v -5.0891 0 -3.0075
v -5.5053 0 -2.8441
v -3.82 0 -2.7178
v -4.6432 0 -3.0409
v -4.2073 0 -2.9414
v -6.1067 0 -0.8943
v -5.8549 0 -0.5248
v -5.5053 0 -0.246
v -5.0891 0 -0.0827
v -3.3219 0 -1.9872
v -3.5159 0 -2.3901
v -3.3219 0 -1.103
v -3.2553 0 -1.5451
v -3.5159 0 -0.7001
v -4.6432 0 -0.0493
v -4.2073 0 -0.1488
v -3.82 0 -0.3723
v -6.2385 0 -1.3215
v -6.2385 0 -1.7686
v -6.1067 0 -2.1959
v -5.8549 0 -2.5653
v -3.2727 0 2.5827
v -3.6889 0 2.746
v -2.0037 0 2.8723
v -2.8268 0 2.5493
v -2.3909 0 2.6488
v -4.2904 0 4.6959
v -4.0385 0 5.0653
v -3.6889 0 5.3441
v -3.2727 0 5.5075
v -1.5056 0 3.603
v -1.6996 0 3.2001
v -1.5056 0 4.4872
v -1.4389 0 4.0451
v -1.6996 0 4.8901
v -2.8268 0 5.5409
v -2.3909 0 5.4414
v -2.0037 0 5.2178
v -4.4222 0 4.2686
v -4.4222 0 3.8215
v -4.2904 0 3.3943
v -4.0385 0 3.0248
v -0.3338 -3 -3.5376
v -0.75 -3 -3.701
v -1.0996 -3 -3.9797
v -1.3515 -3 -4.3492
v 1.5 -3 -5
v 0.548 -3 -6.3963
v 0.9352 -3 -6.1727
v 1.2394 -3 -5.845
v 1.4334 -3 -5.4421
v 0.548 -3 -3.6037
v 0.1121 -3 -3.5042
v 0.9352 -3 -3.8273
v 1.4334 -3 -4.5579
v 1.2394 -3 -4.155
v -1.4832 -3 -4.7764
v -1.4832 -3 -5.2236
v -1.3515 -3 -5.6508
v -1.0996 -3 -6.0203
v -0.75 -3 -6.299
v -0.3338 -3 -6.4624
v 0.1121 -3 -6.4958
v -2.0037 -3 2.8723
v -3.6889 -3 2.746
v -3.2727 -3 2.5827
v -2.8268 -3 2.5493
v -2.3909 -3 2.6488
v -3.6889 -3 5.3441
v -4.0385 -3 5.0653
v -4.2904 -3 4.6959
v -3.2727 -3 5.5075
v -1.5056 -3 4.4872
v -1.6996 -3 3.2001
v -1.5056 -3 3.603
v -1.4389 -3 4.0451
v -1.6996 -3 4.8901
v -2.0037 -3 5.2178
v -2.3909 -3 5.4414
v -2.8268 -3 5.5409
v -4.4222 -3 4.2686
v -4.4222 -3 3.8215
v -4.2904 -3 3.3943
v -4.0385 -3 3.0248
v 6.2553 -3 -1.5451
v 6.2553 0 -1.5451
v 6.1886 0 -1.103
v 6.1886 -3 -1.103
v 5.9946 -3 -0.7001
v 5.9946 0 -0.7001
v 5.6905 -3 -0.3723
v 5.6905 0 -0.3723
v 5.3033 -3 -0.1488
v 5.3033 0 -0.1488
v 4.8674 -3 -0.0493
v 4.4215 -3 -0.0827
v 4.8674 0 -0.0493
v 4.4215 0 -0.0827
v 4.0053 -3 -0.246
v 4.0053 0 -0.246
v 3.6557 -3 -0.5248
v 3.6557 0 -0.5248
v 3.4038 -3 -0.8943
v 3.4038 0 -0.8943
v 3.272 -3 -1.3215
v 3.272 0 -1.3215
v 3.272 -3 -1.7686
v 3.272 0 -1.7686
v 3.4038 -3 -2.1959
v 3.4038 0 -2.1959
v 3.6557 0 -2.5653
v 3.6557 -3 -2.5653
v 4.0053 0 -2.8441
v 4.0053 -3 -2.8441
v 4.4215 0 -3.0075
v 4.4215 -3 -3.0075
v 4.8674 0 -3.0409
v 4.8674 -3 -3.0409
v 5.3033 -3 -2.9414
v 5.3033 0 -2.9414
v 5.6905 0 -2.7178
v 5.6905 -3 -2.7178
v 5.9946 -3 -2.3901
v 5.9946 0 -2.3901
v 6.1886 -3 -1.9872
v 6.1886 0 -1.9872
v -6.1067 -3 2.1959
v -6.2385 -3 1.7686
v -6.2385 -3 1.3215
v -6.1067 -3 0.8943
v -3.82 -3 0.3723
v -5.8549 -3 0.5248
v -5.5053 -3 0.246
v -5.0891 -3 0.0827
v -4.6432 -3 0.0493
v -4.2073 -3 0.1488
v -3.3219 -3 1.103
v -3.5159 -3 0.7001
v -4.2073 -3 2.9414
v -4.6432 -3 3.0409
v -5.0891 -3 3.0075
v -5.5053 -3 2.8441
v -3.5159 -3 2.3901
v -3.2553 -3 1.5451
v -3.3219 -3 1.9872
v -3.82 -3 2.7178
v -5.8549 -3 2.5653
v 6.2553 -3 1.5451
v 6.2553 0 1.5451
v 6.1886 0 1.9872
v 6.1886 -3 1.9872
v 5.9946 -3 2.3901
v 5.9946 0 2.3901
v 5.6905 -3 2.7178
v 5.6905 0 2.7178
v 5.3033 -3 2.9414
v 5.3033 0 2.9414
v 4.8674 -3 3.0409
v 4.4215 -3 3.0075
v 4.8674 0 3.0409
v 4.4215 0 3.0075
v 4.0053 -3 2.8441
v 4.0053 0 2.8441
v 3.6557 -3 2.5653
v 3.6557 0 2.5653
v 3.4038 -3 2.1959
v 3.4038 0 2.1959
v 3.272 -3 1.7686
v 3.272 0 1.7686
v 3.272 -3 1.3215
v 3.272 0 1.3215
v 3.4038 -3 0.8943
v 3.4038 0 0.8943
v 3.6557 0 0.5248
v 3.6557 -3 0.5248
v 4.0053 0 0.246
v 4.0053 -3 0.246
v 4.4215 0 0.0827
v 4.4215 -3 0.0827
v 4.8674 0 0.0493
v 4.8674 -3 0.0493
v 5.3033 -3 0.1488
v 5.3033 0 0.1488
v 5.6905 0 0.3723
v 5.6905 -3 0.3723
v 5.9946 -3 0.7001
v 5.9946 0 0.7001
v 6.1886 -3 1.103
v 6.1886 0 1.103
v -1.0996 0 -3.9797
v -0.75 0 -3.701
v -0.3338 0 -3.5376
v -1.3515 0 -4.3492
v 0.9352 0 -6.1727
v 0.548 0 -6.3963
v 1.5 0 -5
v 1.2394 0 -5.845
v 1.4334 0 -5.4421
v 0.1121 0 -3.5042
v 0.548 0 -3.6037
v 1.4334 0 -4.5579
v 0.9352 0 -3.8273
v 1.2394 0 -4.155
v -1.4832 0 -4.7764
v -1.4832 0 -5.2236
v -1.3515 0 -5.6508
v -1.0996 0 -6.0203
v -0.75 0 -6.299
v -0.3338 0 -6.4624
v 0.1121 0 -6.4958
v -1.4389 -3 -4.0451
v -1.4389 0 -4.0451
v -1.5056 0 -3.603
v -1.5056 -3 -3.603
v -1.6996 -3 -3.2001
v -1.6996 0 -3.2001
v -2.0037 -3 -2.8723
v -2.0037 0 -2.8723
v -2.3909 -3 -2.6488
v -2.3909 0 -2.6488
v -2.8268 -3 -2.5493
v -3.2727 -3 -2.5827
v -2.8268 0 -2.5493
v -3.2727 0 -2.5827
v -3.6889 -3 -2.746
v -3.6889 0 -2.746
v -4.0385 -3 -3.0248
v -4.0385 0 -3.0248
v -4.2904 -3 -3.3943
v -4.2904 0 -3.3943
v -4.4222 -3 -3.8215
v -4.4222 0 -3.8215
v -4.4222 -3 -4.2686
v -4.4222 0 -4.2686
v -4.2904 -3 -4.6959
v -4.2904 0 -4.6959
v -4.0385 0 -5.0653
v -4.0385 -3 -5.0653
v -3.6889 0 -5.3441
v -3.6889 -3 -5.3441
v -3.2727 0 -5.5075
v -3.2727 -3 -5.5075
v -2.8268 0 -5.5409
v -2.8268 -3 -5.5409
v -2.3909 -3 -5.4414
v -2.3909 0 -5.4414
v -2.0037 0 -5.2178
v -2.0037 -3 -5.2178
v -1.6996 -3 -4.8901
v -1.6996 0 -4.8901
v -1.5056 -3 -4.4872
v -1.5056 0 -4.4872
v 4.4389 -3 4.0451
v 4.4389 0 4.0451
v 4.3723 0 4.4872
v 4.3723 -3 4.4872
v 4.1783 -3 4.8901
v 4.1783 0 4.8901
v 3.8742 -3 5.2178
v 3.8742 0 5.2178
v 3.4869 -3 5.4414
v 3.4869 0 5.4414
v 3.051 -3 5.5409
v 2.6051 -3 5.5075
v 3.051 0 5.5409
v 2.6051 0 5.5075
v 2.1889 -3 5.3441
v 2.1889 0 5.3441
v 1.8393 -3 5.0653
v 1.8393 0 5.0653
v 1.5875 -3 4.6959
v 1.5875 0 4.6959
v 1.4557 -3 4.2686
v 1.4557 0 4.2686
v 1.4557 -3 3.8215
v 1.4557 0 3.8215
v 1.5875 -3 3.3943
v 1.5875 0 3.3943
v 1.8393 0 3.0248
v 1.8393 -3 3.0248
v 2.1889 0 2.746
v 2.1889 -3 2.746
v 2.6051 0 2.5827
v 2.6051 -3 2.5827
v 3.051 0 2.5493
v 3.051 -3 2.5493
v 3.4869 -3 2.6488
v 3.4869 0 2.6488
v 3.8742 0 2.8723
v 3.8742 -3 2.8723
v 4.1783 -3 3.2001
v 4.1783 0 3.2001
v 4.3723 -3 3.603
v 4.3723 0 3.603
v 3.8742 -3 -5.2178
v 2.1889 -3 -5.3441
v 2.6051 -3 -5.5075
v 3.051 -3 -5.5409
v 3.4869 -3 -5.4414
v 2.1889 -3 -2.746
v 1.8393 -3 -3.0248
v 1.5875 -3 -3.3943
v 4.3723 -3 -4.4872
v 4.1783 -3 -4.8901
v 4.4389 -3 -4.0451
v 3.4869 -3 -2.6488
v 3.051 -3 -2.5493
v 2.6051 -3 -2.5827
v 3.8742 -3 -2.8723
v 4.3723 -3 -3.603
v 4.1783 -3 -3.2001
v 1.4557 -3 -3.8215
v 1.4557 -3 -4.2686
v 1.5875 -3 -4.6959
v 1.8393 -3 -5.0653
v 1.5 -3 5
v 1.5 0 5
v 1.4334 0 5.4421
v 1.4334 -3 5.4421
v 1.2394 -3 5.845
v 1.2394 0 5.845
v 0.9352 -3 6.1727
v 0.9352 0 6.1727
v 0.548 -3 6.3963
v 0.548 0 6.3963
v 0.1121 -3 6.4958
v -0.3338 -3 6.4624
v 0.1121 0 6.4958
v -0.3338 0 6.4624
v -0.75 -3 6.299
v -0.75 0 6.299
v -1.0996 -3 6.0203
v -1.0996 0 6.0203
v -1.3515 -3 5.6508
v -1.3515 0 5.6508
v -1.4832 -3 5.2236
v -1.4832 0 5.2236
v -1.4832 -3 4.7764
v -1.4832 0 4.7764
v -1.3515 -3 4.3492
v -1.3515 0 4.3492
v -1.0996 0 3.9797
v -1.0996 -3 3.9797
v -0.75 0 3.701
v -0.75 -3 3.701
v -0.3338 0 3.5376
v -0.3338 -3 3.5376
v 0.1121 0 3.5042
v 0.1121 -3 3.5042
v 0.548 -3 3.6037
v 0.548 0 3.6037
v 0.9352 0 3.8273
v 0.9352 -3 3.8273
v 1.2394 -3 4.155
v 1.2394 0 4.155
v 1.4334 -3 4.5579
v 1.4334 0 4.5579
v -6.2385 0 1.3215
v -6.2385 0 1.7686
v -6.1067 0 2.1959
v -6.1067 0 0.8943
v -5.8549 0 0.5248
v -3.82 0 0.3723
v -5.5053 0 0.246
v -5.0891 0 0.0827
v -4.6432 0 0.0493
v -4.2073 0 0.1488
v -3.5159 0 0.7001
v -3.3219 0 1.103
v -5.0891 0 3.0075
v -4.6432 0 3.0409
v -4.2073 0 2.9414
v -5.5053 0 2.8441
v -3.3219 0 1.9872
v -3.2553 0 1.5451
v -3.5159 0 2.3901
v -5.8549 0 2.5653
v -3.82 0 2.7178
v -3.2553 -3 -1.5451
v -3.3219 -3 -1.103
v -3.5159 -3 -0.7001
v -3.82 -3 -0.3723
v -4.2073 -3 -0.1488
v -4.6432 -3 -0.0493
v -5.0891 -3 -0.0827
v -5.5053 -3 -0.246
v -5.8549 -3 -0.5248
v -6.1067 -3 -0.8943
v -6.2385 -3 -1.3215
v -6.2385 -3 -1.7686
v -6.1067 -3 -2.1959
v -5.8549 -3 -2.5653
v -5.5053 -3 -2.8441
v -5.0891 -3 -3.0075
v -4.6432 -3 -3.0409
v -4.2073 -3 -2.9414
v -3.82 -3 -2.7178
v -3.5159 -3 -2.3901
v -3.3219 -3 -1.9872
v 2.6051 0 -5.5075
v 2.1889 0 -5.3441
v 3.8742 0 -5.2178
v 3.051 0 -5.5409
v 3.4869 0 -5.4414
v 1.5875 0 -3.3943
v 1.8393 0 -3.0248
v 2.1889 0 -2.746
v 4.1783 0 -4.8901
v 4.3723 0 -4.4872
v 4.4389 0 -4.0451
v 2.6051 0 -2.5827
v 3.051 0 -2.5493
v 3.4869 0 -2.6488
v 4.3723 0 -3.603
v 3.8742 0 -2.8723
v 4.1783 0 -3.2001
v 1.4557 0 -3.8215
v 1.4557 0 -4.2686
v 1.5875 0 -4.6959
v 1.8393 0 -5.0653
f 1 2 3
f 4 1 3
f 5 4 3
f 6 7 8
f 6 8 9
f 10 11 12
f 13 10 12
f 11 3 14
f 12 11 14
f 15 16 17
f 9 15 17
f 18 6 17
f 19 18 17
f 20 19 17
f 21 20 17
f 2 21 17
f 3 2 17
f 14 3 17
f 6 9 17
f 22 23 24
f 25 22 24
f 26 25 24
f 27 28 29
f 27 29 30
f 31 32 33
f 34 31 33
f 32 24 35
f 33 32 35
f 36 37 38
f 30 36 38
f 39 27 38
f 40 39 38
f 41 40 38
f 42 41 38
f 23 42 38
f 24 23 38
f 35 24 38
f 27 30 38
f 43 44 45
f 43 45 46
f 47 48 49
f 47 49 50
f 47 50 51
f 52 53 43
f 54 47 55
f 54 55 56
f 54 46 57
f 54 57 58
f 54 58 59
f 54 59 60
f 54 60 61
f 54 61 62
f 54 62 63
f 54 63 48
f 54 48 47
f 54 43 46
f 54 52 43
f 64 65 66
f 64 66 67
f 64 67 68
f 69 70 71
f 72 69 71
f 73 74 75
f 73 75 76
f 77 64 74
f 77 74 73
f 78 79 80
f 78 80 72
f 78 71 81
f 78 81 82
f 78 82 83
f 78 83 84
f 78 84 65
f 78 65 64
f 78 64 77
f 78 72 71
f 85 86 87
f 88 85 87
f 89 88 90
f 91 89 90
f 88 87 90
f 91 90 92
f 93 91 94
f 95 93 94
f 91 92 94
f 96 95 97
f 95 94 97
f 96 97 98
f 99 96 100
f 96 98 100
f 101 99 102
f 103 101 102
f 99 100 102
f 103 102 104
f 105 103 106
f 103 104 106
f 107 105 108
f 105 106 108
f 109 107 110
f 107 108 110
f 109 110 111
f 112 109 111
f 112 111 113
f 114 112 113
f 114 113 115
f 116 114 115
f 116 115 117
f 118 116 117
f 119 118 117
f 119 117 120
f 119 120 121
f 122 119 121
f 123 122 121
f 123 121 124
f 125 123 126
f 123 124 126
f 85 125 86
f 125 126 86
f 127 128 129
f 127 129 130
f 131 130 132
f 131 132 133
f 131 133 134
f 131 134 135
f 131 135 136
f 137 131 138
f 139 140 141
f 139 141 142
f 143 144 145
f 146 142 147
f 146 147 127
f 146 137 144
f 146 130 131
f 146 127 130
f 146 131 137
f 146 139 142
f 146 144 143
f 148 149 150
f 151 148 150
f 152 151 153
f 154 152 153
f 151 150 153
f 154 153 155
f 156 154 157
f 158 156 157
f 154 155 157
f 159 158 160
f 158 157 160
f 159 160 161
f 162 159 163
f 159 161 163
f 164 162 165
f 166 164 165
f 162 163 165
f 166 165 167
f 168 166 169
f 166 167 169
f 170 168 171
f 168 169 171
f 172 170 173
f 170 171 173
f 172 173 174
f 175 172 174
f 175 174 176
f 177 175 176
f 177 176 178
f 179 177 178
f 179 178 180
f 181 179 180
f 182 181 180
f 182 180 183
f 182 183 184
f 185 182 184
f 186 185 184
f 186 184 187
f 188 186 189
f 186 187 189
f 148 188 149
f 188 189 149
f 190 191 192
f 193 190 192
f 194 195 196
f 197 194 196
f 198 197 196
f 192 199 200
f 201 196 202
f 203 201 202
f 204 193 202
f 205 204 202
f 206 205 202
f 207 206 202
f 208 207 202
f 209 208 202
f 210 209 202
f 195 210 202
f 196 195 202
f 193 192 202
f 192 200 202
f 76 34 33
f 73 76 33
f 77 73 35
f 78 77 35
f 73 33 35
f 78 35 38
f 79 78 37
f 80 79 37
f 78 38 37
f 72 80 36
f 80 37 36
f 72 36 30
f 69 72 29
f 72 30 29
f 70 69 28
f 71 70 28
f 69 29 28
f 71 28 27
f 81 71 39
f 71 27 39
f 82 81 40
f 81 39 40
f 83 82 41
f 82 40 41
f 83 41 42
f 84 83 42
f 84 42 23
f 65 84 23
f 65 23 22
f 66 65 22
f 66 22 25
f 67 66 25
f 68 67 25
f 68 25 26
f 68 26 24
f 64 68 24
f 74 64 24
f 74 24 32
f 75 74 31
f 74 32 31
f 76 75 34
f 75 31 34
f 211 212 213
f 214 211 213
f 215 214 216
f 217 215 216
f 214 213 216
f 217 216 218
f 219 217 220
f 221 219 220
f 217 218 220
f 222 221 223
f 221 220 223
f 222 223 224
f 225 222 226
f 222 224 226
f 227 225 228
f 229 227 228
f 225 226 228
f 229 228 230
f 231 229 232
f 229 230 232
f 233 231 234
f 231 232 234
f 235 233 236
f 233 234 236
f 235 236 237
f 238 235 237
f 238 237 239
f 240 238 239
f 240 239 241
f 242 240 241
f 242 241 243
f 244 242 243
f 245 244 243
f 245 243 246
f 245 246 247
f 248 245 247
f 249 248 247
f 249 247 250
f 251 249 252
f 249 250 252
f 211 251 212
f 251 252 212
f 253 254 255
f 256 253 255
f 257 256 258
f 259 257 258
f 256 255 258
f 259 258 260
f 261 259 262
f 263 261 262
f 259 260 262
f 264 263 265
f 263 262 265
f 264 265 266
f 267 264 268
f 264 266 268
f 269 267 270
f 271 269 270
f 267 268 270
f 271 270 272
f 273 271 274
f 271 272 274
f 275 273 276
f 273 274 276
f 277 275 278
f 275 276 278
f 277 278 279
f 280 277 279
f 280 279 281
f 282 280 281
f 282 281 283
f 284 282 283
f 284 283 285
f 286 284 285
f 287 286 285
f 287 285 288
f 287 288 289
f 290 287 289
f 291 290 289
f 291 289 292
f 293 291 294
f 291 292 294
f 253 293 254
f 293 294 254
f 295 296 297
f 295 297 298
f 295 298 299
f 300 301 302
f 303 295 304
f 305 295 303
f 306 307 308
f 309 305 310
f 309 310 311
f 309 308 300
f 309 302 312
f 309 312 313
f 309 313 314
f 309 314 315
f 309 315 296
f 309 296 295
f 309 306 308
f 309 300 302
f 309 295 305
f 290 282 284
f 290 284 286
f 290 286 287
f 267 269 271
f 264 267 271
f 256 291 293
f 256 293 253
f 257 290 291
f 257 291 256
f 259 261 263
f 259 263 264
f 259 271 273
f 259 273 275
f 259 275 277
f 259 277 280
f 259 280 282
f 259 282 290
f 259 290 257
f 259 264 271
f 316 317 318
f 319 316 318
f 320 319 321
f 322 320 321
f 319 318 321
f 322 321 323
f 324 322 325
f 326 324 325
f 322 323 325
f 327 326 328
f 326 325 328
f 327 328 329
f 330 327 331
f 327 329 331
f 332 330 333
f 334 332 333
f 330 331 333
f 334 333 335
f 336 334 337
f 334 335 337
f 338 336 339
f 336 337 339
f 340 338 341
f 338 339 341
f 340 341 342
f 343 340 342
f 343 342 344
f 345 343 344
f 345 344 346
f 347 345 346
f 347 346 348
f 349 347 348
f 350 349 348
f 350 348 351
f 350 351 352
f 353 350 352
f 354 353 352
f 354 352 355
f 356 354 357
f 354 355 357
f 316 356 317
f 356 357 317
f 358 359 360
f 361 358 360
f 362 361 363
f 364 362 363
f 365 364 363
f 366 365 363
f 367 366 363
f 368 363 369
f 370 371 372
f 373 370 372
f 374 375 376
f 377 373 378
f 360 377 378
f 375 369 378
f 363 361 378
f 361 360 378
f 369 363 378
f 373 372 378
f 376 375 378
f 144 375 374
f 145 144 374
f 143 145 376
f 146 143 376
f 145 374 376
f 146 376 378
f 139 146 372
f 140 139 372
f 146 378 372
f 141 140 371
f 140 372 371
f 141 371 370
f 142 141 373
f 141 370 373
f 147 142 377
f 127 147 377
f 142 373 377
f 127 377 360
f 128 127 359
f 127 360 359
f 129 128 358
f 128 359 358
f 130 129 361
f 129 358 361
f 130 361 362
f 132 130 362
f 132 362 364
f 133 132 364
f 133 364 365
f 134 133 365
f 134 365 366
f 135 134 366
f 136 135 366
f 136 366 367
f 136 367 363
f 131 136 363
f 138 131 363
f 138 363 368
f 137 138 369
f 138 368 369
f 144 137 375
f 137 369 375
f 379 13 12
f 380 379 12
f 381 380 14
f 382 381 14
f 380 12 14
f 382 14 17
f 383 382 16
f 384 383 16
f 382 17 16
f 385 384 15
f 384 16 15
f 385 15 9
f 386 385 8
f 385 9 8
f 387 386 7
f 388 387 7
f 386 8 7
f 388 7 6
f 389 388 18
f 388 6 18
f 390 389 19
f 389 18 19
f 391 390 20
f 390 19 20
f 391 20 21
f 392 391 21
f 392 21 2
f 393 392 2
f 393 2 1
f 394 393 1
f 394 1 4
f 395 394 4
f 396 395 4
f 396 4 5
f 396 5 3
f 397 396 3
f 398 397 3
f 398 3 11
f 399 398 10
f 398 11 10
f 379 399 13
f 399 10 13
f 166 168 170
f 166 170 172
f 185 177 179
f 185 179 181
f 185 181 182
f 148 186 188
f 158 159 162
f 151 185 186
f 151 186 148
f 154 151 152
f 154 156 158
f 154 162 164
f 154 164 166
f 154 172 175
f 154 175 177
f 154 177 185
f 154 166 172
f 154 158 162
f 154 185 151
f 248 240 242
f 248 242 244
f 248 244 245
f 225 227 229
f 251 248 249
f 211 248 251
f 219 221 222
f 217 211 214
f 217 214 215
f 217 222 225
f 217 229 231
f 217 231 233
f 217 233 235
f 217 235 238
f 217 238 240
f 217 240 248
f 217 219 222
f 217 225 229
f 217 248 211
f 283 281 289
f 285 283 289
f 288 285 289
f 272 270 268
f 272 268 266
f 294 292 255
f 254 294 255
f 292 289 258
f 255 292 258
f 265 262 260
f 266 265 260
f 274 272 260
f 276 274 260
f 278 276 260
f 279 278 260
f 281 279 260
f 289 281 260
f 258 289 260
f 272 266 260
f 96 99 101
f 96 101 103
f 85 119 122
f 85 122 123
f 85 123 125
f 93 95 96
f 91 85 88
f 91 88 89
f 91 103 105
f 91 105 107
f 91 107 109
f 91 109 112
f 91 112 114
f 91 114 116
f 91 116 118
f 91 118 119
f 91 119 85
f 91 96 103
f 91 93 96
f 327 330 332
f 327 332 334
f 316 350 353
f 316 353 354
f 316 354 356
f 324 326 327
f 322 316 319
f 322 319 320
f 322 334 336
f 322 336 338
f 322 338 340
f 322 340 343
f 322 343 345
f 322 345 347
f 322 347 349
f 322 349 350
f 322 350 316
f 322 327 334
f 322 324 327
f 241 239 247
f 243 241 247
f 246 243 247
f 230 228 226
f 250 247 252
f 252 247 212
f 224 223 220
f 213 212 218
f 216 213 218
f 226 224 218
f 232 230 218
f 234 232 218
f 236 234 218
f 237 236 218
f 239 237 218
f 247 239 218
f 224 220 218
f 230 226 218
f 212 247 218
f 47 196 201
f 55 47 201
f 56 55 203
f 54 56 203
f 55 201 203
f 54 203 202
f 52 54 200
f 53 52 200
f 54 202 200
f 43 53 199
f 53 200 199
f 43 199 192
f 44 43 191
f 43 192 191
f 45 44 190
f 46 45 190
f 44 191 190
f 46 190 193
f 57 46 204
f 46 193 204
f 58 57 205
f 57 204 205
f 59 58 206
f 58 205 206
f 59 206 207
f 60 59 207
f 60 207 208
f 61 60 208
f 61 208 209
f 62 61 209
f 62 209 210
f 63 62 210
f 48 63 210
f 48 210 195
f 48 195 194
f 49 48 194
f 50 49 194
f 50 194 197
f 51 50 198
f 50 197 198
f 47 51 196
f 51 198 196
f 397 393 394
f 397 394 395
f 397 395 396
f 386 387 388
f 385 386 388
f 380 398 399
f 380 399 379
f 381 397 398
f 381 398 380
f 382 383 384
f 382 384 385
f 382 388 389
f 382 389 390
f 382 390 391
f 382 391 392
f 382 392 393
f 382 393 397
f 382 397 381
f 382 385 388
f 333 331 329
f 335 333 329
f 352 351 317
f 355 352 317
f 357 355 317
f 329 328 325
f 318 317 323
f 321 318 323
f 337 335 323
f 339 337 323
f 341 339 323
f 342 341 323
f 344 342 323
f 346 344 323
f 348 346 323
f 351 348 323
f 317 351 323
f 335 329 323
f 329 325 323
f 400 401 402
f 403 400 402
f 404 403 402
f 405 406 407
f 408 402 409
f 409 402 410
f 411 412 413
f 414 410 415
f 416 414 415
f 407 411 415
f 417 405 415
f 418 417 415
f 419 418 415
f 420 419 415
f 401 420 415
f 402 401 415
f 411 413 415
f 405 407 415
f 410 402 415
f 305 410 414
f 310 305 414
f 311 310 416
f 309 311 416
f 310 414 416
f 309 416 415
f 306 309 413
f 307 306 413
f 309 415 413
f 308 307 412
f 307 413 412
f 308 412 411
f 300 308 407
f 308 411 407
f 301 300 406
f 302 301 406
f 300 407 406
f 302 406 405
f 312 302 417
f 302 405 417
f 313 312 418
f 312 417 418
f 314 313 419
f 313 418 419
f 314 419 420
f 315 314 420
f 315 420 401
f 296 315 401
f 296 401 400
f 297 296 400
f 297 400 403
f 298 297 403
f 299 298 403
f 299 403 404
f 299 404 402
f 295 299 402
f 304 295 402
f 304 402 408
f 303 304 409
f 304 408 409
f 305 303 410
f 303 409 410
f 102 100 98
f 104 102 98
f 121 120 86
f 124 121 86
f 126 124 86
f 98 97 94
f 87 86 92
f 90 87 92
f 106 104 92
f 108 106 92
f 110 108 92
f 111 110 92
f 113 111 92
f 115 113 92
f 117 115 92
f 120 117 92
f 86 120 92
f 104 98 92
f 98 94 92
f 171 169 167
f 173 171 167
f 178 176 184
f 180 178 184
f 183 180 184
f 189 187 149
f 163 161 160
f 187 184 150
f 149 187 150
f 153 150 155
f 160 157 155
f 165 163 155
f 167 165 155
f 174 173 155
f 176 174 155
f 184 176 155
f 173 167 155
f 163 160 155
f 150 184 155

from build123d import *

# Parameters (mm, degrees)
F0_R     = 1.5
F1_DEPTH = 3


with BuildPart() as f1:
    # F0 (on Front) → F1 (new body)
    with BuildSketch(Plane.XZ):
        with Locations((0, -5)):
            Circle(F0_R)
        with Locations((2.938926, -4.045085)):
            Circle(F0_R)
        with Locations((4.755283, -1.545085)):
            Circle(F0_R)
        with Locations((4.755283, 1.545085)):
            Circle(F0_R)
        with Locations((2.938926, 4.045085)):
            Circle(F0_R)
        with Locations((0, 5)):
            Circle(F0_R)
        with Locations((-2.938926, 4.045085)):
            Circle(F0_R)
        with Locations((-4.755283, 1.545085)):
            Circle(F0_R)
        with Locations((-4.755283, -1.545085)):
            Circle(F0_R)
        with Locations((-2.938926, -4.045085)):
            Circle(F0_R)
    extrude(amount=F1_DEPTH)


solid = f1.part
